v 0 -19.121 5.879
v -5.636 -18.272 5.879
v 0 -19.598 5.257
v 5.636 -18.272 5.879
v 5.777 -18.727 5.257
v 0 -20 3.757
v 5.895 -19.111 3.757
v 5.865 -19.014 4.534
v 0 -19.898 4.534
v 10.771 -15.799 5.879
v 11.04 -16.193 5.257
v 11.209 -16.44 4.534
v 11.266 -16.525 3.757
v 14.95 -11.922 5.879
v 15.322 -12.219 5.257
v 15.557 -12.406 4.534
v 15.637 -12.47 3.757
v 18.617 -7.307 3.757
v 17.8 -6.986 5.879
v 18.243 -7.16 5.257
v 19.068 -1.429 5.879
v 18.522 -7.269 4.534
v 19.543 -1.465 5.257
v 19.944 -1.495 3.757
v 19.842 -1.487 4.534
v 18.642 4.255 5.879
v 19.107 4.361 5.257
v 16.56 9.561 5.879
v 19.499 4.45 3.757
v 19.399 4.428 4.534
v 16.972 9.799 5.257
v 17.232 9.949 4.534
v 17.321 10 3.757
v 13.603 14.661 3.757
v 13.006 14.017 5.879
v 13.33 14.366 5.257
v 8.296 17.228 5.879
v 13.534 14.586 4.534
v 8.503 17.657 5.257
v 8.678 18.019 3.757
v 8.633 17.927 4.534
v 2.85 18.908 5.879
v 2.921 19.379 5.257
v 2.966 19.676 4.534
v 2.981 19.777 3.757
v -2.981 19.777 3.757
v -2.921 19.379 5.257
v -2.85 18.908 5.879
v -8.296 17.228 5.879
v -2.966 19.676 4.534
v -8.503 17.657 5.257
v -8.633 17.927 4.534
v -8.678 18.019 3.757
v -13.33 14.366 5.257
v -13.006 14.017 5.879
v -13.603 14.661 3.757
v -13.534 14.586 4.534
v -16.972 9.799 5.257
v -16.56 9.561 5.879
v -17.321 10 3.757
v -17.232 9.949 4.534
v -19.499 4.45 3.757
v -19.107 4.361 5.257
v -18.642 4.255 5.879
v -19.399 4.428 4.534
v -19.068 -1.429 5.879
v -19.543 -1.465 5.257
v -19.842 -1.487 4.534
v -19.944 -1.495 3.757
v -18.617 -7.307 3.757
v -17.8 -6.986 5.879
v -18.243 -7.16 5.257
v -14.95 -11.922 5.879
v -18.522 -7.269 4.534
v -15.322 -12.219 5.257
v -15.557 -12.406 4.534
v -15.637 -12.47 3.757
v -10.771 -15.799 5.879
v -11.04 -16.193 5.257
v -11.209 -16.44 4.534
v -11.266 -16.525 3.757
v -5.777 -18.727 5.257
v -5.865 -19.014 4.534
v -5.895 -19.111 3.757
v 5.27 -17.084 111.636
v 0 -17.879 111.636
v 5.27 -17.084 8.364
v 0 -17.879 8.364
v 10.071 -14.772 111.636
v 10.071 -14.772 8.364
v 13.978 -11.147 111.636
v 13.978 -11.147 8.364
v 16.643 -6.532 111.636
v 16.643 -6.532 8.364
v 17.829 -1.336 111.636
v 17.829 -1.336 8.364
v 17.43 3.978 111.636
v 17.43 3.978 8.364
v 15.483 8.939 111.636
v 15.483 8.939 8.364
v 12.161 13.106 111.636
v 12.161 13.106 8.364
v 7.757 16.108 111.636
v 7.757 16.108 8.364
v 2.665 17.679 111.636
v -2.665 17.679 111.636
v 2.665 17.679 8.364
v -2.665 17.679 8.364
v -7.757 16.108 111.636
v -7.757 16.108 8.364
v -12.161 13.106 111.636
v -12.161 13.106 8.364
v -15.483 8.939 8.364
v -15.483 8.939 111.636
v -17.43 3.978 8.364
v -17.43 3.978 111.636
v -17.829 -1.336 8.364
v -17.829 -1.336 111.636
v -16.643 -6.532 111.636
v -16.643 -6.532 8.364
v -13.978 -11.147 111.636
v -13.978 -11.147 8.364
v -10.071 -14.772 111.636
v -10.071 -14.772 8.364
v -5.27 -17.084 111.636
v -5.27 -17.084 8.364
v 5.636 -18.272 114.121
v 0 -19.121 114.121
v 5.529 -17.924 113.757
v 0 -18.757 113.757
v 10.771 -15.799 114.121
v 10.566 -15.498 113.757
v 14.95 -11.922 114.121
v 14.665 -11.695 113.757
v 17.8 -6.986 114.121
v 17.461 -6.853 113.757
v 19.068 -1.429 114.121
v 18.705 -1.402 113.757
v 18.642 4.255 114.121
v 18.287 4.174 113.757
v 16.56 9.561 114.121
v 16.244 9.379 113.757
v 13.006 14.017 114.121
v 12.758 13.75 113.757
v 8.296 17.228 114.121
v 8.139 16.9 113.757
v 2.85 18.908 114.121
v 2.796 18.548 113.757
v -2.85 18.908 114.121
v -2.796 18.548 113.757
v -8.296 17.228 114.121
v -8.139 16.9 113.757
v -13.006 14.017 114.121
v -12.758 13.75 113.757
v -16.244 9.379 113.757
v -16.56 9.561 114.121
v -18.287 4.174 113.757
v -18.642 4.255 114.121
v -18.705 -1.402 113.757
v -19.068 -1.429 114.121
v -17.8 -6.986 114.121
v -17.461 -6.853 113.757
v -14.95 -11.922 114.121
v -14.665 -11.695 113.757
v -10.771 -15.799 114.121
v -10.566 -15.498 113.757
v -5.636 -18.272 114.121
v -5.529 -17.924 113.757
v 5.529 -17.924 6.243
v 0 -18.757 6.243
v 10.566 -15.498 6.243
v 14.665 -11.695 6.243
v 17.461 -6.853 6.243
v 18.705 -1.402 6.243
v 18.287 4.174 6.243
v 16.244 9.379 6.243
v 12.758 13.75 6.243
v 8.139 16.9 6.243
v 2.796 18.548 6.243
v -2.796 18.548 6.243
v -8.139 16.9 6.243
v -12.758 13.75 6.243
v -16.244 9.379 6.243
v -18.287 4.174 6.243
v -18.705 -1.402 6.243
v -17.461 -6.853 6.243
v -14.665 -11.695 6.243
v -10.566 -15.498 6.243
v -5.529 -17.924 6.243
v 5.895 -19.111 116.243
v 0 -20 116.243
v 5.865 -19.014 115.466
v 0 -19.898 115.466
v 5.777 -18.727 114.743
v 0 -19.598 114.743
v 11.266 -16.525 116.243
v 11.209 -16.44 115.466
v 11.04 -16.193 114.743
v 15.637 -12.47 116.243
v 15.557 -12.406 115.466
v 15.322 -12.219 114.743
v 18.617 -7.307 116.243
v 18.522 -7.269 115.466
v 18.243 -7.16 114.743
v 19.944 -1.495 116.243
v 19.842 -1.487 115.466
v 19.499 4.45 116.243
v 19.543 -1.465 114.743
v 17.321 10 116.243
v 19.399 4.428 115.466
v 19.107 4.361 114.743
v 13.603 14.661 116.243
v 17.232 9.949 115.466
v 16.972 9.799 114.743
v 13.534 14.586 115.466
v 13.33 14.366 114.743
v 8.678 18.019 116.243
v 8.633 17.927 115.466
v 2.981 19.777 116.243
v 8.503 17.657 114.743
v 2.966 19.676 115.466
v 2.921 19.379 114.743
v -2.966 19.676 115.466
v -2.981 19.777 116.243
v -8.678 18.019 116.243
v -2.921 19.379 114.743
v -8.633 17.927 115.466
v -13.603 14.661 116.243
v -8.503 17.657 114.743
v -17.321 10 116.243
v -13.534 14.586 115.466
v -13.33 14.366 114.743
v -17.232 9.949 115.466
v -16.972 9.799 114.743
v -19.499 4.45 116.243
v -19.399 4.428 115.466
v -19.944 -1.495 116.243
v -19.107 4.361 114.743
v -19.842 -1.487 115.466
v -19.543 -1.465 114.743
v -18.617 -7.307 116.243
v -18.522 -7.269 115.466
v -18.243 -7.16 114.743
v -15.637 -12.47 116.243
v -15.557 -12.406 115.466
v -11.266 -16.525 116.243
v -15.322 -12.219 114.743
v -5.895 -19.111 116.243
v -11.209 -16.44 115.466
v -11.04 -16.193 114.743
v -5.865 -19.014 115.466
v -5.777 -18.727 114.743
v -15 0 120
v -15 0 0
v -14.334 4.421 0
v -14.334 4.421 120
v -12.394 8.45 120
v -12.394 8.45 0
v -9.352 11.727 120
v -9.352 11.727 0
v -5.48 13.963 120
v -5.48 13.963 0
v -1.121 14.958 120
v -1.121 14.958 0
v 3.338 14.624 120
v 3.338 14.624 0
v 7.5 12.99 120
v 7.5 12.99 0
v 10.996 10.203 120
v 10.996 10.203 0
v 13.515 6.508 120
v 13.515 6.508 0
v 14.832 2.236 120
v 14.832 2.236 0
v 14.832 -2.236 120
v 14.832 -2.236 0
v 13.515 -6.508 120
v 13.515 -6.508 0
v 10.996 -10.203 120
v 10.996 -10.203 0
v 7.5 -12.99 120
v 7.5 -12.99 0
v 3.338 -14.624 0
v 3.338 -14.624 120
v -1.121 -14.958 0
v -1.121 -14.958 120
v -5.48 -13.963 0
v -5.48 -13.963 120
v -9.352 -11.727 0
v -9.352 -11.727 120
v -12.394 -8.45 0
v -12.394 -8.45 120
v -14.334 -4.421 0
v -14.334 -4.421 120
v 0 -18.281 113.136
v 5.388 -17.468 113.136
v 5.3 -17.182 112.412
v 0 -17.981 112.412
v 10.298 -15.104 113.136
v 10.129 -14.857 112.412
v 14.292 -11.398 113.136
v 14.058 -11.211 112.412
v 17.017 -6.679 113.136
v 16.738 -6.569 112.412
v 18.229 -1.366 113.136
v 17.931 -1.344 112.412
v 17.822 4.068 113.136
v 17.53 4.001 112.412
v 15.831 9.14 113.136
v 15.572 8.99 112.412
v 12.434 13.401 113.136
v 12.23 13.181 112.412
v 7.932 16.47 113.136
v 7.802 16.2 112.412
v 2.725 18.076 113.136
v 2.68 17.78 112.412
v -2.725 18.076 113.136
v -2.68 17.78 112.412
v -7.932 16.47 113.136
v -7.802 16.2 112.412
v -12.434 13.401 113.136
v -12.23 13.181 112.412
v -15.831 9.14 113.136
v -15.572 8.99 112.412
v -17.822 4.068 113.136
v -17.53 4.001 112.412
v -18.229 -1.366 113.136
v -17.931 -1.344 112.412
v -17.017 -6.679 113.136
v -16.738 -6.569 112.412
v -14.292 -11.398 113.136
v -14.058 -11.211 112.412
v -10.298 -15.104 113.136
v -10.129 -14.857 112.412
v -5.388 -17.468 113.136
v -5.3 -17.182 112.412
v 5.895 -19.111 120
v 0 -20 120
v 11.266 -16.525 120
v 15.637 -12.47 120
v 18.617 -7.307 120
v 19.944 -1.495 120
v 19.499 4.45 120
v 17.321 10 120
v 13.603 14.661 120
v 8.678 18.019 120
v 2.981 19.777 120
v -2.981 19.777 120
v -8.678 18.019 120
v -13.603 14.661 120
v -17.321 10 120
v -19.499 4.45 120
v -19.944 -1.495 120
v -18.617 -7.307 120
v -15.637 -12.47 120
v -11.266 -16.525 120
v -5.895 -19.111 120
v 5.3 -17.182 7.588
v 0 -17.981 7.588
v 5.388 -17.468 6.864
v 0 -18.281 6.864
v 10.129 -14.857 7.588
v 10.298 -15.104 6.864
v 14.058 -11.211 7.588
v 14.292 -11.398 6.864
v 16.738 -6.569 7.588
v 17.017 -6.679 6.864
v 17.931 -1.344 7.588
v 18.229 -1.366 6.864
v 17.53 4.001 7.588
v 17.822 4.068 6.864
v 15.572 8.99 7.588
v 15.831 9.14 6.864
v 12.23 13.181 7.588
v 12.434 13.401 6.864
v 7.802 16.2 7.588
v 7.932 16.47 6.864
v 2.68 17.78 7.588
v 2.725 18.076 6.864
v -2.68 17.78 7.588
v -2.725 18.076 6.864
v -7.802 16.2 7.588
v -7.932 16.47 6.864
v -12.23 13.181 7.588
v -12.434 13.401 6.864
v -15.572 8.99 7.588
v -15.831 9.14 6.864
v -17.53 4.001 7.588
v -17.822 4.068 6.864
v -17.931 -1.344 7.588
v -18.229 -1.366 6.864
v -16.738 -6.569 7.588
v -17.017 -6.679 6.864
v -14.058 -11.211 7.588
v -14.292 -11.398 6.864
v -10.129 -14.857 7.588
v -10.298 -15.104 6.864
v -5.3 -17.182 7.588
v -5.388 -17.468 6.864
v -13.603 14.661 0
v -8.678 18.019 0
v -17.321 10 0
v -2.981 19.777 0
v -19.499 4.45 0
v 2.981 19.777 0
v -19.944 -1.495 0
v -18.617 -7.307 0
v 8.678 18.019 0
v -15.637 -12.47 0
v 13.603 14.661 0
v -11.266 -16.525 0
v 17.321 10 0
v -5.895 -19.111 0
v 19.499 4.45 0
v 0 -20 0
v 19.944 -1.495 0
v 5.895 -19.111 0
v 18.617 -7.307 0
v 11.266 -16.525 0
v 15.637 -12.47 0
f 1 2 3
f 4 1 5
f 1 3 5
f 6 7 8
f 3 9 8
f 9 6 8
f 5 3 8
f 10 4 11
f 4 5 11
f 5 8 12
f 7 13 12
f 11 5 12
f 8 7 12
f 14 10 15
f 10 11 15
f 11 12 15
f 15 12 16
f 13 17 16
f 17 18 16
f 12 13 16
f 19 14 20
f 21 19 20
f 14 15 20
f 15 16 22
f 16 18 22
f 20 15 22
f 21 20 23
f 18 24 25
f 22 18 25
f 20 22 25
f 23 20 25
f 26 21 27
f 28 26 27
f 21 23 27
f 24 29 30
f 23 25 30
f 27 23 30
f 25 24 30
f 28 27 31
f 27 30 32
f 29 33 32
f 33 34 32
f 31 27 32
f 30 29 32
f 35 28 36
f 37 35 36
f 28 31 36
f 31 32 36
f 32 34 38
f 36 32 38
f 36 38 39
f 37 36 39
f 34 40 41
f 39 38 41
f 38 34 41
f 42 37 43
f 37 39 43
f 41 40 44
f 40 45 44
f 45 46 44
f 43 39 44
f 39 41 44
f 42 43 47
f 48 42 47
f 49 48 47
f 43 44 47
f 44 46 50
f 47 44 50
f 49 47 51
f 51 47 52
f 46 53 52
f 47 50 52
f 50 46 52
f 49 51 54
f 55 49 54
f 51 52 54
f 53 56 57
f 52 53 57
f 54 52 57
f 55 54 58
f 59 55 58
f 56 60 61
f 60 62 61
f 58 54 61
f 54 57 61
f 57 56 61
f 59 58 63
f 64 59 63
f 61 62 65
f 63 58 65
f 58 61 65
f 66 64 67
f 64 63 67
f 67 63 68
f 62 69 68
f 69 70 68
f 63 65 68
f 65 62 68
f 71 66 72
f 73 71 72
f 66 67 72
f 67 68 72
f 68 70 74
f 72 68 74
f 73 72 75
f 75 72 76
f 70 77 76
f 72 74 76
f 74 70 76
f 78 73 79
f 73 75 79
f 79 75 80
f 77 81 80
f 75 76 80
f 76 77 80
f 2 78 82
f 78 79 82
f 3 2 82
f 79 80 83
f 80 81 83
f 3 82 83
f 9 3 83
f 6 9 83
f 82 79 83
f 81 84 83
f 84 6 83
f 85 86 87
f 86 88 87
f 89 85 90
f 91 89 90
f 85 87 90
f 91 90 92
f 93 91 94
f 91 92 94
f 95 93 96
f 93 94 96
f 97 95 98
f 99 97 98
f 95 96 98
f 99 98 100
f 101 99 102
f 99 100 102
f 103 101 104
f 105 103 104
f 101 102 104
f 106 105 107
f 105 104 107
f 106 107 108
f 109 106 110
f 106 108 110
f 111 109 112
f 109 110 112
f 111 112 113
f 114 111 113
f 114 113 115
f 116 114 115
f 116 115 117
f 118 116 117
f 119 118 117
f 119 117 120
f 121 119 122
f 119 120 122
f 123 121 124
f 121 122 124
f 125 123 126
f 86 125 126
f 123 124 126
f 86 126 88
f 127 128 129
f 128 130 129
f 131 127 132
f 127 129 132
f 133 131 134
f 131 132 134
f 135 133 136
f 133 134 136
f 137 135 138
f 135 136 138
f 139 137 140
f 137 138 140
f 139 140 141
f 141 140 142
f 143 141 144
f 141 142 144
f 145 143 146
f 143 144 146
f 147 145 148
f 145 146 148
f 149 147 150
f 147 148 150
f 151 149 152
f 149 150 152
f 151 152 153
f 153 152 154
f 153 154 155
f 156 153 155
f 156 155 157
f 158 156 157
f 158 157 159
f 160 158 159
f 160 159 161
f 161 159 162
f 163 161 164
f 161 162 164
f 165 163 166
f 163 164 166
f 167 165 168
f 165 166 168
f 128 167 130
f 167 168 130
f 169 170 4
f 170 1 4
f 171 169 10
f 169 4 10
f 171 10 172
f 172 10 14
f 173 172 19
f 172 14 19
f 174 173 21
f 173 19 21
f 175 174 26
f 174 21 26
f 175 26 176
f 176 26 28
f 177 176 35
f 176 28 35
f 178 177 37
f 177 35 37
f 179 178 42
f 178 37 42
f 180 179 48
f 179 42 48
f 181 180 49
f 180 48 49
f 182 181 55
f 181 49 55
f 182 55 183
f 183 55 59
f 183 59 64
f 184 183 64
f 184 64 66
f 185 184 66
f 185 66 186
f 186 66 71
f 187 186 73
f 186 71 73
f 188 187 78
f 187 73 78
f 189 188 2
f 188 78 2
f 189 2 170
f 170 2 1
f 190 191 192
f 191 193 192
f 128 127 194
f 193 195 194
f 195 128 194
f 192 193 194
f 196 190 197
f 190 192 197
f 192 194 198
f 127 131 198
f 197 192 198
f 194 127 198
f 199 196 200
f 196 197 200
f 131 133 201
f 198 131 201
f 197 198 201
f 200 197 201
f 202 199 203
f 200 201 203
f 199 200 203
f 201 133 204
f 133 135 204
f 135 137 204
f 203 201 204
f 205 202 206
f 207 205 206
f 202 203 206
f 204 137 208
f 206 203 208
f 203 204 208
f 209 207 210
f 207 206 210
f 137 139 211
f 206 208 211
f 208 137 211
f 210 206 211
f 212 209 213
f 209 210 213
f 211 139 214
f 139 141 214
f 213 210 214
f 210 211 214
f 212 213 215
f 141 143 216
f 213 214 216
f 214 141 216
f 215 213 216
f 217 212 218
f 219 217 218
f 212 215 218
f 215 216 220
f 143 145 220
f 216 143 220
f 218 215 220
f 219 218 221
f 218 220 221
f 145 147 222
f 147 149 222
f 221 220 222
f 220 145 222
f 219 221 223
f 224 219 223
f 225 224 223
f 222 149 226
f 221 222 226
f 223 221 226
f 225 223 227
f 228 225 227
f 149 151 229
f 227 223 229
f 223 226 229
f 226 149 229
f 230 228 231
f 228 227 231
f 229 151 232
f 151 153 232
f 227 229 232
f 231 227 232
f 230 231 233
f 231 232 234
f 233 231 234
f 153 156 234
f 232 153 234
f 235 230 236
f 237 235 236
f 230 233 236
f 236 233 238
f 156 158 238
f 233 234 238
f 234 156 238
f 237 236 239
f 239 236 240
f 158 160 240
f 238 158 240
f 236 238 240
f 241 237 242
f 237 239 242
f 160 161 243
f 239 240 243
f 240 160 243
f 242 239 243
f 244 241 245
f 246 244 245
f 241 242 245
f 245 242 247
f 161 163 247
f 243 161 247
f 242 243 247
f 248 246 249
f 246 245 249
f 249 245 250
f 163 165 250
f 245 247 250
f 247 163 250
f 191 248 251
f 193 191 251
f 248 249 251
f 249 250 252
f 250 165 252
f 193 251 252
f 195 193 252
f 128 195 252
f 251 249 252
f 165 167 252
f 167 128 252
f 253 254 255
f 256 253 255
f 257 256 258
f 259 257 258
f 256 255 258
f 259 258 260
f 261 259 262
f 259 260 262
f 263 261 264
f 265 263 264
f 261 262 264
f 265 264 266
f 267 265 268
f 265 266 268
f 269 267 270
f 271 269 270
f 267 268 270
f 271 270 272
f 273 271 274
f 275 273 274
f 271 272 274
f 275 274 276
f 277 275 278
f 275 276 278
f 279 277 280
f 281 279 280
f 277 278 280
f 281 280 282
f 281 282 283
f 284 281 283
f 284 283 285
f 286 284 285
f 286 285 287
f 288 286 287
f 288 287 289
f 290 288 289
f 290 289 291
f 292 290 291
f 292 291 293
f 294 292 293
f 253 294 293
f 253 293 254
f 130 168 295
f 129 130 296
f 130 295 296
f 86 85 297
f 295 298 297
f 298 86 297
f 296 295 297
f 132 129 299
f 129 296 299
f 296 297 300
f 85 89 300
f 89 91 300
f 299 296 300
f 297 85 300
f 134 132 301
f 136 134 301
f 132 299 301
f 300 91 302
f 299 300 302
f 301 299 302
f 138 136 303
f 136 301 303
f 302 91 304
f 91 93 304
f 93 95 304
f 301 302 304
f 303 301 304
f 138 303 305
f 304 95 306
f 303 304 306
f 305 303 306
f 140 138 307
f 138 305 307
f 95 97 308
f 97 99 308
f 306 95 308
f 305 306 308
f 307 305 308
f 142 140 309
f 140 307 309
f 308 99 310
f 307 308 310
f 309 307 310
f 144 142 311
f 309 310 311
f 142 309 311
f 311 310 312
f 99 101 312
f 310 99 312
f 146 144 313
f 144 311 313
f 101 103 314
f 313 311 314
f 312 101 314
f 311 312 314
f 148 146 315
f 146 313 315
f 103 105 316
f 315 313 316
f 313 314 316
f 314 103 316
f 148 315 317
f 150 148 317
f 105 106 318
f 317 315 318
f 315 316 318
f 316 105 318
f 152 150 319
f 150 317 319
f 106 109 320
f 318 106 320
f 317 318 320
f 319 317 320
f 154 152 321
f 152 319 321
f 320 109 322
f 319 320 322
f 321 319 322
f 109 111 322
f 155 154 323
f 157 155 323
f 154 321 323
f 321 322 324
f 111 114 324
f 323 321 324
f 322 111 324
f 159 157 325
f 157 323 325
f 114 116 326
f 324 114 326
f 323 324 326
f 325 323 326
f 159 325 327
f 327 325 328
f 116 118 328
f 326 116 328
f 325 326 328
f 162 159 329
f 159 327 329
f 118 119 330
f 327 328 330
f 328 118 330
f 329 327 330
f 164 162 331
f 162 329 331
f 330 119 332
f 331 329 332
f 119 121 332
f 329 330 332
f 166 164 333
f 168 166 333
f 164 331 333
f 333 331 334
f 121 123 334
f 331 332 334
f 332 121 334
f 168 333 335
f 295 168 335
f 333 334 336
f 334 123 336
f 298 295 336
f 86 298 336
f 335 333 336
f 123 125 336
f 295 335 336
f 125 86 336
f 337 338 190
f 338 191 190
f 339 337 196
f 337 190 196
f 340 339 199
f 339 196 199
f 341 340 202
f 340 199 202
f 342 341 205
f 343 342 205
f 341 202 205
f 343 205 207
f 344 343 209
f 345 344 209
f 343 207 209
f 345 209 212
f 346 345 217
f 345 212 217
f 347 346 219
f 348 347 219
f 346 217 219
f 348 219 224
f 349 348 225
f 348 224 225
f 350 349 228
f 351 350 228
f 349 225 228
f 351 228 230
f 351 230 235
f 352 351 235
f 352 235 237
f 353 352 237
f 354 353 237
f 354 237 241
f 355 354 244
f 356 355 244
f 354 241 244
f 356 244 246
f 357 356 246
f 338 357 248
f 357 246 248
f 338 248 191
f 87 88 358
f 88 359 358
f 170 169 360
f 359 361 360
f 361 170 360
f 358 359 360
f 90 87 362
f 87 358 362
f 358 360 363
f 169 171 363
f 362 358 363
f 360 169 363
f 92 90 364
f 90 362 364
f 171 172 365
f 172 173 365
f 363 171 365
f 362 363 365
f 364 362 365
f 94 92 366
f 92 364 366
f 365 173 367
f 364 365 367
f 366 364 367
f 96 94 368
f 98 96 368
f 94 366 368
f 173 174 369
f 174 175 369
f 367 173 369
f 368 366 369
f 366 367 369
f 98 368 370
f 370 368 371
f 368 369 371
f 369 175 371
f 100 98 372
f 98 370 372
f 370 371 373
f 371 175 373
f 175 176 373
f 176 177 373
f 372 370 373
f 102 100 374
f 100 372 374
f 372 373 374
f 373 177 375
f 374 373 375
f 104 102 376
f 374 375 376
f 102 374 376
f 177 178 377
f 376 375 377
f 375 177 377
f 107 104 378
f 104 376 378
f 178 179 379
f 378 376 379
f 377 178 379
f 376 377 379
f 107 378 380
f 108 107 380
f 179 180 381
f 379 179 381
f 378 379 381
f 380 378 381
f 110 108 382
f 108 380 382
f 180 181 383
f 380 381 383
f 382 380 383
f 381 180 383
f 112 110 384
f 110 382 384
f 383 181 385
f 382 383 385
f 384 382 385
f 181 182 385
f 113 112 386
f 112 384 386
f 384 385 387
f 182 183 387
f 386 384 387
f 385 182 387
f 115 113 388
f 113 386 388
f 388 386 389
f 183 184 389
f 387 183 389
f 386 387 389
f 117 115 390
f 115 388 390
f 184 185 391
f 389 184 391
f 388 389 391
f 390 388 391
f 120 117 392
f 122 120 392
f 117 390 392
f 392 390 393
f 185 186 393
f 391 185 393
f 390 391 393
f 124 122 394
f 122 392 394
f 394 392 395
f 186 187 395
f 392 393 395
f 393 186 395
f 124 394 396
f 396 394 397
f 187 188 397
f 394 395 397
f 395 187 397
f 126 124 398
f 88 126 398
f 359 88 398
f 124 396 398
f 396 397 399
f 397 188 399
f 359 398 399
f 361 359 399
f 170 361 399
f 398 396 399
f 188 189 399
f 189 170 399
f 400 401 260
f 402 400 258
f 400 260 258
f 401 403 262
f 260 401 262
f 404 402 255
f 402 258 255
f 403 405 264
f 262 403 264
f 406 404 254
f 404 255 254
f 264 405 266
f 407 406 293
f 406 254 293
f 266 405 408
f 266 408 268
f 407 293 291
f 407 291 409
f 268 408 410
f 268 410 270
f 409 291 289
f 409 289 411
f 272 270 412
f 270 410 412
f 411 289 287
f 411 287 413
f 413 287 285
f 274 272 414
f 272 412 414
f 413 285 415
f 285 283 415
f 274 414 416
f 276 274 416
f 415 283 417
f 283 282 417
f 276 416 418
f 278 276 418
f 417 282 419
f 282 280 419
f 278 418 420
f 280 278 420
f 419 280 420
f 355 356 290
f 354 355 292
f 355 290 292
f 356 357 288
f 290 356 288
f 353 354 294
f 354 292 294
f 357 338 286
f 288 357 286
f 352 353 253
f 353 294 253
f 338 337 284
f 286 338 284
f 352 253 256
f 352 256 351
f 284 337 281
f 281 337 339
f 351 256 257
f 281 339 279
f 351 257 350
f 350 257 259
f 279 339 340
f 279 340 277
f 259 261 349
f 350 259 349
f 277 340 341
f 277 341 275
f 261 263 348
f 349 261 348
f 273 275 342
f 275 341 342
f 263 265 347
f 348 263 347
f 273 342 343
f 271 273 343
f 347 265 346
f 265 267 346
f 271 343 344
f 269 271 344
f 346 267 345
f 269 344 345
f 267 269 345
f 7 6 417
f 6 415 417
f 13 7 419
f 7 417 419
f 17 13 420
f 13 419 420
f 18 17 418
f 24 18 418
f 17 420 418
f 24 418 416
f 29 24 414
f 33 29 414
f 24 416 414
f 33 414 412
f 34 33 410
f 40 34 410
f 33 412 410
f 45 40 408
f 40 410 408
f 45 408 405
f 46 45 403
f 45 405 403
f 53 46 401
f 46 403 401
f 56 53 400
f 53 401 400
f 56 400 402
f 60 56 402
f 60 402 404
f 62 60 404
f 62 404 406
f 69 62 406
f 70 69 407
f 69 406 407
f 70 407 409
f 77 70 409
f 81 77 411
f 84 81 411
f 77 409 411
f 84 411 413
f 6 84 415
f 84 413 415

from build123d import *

# Parameters (mm, degrees)
SKETCH2_R          = 15
CUT_EXTRUDE1_DEPTH = 121


with BuildPart() as part:
    # Sketch1 → Revolve2 (revolve)
    with BuildSketch(Plane(origin=(0, 0, 0), x_dir=(0, 0, -1), z_dir=(1, 0, 0))):
        with BuildLine():
            Line((0, 0), (-120, 0))
            Line((-120, 0), (-120, -20))
            Line((-120, -20), (-116.242640687, -20))
            ThreePointArc((-116.242640687, -20), (-115.09459039, -19.771638598), (-114.121320344, -19.121320344))
            Line((-114.121320344, -19.121320344), (-113.757359313, -18.757359313))
            ThreePointArc((-113.757359313, -18.757359313), (-112.784089266, -18.107041059), (-111.636038969, -17.878679656))
            Line((-111.636038969, -17.878679656), (-8.363961031, -17.878679656))
            ThreePointArc((-8.363961031, -17.878679656), (-7.215910734, -18.107041059), (-6.242640687, -18.757359313))
            Line((-6.242640687, -18.757359313), (-5.878679656, -19.121320344))
            ThreePointArc((-5.878679656, -19.121320344), (-4.90540961, -19.771638598), (-3.757359313, -20))
            Line((-3.757359313, -20), (0, -20))
            Line((0, -20), (0, 0))
        make_face()
    revolve(axis=Axis((0, 0, 0), (0, 0, 1)))

    # Sketch2 → Cut-Extrude1 (cut, through all)
    with BuildSketch(Plane(origin=(0, 0, 0), x_dir=(-1, 0, 0), z_dir=(0, 0, -1))):
        Circle(SKETCH2_R)
    extrude(amount=-CUT_EXTRUDE1_DEPTH, mode=Mode.SUBTRACT)


solid = part.part
